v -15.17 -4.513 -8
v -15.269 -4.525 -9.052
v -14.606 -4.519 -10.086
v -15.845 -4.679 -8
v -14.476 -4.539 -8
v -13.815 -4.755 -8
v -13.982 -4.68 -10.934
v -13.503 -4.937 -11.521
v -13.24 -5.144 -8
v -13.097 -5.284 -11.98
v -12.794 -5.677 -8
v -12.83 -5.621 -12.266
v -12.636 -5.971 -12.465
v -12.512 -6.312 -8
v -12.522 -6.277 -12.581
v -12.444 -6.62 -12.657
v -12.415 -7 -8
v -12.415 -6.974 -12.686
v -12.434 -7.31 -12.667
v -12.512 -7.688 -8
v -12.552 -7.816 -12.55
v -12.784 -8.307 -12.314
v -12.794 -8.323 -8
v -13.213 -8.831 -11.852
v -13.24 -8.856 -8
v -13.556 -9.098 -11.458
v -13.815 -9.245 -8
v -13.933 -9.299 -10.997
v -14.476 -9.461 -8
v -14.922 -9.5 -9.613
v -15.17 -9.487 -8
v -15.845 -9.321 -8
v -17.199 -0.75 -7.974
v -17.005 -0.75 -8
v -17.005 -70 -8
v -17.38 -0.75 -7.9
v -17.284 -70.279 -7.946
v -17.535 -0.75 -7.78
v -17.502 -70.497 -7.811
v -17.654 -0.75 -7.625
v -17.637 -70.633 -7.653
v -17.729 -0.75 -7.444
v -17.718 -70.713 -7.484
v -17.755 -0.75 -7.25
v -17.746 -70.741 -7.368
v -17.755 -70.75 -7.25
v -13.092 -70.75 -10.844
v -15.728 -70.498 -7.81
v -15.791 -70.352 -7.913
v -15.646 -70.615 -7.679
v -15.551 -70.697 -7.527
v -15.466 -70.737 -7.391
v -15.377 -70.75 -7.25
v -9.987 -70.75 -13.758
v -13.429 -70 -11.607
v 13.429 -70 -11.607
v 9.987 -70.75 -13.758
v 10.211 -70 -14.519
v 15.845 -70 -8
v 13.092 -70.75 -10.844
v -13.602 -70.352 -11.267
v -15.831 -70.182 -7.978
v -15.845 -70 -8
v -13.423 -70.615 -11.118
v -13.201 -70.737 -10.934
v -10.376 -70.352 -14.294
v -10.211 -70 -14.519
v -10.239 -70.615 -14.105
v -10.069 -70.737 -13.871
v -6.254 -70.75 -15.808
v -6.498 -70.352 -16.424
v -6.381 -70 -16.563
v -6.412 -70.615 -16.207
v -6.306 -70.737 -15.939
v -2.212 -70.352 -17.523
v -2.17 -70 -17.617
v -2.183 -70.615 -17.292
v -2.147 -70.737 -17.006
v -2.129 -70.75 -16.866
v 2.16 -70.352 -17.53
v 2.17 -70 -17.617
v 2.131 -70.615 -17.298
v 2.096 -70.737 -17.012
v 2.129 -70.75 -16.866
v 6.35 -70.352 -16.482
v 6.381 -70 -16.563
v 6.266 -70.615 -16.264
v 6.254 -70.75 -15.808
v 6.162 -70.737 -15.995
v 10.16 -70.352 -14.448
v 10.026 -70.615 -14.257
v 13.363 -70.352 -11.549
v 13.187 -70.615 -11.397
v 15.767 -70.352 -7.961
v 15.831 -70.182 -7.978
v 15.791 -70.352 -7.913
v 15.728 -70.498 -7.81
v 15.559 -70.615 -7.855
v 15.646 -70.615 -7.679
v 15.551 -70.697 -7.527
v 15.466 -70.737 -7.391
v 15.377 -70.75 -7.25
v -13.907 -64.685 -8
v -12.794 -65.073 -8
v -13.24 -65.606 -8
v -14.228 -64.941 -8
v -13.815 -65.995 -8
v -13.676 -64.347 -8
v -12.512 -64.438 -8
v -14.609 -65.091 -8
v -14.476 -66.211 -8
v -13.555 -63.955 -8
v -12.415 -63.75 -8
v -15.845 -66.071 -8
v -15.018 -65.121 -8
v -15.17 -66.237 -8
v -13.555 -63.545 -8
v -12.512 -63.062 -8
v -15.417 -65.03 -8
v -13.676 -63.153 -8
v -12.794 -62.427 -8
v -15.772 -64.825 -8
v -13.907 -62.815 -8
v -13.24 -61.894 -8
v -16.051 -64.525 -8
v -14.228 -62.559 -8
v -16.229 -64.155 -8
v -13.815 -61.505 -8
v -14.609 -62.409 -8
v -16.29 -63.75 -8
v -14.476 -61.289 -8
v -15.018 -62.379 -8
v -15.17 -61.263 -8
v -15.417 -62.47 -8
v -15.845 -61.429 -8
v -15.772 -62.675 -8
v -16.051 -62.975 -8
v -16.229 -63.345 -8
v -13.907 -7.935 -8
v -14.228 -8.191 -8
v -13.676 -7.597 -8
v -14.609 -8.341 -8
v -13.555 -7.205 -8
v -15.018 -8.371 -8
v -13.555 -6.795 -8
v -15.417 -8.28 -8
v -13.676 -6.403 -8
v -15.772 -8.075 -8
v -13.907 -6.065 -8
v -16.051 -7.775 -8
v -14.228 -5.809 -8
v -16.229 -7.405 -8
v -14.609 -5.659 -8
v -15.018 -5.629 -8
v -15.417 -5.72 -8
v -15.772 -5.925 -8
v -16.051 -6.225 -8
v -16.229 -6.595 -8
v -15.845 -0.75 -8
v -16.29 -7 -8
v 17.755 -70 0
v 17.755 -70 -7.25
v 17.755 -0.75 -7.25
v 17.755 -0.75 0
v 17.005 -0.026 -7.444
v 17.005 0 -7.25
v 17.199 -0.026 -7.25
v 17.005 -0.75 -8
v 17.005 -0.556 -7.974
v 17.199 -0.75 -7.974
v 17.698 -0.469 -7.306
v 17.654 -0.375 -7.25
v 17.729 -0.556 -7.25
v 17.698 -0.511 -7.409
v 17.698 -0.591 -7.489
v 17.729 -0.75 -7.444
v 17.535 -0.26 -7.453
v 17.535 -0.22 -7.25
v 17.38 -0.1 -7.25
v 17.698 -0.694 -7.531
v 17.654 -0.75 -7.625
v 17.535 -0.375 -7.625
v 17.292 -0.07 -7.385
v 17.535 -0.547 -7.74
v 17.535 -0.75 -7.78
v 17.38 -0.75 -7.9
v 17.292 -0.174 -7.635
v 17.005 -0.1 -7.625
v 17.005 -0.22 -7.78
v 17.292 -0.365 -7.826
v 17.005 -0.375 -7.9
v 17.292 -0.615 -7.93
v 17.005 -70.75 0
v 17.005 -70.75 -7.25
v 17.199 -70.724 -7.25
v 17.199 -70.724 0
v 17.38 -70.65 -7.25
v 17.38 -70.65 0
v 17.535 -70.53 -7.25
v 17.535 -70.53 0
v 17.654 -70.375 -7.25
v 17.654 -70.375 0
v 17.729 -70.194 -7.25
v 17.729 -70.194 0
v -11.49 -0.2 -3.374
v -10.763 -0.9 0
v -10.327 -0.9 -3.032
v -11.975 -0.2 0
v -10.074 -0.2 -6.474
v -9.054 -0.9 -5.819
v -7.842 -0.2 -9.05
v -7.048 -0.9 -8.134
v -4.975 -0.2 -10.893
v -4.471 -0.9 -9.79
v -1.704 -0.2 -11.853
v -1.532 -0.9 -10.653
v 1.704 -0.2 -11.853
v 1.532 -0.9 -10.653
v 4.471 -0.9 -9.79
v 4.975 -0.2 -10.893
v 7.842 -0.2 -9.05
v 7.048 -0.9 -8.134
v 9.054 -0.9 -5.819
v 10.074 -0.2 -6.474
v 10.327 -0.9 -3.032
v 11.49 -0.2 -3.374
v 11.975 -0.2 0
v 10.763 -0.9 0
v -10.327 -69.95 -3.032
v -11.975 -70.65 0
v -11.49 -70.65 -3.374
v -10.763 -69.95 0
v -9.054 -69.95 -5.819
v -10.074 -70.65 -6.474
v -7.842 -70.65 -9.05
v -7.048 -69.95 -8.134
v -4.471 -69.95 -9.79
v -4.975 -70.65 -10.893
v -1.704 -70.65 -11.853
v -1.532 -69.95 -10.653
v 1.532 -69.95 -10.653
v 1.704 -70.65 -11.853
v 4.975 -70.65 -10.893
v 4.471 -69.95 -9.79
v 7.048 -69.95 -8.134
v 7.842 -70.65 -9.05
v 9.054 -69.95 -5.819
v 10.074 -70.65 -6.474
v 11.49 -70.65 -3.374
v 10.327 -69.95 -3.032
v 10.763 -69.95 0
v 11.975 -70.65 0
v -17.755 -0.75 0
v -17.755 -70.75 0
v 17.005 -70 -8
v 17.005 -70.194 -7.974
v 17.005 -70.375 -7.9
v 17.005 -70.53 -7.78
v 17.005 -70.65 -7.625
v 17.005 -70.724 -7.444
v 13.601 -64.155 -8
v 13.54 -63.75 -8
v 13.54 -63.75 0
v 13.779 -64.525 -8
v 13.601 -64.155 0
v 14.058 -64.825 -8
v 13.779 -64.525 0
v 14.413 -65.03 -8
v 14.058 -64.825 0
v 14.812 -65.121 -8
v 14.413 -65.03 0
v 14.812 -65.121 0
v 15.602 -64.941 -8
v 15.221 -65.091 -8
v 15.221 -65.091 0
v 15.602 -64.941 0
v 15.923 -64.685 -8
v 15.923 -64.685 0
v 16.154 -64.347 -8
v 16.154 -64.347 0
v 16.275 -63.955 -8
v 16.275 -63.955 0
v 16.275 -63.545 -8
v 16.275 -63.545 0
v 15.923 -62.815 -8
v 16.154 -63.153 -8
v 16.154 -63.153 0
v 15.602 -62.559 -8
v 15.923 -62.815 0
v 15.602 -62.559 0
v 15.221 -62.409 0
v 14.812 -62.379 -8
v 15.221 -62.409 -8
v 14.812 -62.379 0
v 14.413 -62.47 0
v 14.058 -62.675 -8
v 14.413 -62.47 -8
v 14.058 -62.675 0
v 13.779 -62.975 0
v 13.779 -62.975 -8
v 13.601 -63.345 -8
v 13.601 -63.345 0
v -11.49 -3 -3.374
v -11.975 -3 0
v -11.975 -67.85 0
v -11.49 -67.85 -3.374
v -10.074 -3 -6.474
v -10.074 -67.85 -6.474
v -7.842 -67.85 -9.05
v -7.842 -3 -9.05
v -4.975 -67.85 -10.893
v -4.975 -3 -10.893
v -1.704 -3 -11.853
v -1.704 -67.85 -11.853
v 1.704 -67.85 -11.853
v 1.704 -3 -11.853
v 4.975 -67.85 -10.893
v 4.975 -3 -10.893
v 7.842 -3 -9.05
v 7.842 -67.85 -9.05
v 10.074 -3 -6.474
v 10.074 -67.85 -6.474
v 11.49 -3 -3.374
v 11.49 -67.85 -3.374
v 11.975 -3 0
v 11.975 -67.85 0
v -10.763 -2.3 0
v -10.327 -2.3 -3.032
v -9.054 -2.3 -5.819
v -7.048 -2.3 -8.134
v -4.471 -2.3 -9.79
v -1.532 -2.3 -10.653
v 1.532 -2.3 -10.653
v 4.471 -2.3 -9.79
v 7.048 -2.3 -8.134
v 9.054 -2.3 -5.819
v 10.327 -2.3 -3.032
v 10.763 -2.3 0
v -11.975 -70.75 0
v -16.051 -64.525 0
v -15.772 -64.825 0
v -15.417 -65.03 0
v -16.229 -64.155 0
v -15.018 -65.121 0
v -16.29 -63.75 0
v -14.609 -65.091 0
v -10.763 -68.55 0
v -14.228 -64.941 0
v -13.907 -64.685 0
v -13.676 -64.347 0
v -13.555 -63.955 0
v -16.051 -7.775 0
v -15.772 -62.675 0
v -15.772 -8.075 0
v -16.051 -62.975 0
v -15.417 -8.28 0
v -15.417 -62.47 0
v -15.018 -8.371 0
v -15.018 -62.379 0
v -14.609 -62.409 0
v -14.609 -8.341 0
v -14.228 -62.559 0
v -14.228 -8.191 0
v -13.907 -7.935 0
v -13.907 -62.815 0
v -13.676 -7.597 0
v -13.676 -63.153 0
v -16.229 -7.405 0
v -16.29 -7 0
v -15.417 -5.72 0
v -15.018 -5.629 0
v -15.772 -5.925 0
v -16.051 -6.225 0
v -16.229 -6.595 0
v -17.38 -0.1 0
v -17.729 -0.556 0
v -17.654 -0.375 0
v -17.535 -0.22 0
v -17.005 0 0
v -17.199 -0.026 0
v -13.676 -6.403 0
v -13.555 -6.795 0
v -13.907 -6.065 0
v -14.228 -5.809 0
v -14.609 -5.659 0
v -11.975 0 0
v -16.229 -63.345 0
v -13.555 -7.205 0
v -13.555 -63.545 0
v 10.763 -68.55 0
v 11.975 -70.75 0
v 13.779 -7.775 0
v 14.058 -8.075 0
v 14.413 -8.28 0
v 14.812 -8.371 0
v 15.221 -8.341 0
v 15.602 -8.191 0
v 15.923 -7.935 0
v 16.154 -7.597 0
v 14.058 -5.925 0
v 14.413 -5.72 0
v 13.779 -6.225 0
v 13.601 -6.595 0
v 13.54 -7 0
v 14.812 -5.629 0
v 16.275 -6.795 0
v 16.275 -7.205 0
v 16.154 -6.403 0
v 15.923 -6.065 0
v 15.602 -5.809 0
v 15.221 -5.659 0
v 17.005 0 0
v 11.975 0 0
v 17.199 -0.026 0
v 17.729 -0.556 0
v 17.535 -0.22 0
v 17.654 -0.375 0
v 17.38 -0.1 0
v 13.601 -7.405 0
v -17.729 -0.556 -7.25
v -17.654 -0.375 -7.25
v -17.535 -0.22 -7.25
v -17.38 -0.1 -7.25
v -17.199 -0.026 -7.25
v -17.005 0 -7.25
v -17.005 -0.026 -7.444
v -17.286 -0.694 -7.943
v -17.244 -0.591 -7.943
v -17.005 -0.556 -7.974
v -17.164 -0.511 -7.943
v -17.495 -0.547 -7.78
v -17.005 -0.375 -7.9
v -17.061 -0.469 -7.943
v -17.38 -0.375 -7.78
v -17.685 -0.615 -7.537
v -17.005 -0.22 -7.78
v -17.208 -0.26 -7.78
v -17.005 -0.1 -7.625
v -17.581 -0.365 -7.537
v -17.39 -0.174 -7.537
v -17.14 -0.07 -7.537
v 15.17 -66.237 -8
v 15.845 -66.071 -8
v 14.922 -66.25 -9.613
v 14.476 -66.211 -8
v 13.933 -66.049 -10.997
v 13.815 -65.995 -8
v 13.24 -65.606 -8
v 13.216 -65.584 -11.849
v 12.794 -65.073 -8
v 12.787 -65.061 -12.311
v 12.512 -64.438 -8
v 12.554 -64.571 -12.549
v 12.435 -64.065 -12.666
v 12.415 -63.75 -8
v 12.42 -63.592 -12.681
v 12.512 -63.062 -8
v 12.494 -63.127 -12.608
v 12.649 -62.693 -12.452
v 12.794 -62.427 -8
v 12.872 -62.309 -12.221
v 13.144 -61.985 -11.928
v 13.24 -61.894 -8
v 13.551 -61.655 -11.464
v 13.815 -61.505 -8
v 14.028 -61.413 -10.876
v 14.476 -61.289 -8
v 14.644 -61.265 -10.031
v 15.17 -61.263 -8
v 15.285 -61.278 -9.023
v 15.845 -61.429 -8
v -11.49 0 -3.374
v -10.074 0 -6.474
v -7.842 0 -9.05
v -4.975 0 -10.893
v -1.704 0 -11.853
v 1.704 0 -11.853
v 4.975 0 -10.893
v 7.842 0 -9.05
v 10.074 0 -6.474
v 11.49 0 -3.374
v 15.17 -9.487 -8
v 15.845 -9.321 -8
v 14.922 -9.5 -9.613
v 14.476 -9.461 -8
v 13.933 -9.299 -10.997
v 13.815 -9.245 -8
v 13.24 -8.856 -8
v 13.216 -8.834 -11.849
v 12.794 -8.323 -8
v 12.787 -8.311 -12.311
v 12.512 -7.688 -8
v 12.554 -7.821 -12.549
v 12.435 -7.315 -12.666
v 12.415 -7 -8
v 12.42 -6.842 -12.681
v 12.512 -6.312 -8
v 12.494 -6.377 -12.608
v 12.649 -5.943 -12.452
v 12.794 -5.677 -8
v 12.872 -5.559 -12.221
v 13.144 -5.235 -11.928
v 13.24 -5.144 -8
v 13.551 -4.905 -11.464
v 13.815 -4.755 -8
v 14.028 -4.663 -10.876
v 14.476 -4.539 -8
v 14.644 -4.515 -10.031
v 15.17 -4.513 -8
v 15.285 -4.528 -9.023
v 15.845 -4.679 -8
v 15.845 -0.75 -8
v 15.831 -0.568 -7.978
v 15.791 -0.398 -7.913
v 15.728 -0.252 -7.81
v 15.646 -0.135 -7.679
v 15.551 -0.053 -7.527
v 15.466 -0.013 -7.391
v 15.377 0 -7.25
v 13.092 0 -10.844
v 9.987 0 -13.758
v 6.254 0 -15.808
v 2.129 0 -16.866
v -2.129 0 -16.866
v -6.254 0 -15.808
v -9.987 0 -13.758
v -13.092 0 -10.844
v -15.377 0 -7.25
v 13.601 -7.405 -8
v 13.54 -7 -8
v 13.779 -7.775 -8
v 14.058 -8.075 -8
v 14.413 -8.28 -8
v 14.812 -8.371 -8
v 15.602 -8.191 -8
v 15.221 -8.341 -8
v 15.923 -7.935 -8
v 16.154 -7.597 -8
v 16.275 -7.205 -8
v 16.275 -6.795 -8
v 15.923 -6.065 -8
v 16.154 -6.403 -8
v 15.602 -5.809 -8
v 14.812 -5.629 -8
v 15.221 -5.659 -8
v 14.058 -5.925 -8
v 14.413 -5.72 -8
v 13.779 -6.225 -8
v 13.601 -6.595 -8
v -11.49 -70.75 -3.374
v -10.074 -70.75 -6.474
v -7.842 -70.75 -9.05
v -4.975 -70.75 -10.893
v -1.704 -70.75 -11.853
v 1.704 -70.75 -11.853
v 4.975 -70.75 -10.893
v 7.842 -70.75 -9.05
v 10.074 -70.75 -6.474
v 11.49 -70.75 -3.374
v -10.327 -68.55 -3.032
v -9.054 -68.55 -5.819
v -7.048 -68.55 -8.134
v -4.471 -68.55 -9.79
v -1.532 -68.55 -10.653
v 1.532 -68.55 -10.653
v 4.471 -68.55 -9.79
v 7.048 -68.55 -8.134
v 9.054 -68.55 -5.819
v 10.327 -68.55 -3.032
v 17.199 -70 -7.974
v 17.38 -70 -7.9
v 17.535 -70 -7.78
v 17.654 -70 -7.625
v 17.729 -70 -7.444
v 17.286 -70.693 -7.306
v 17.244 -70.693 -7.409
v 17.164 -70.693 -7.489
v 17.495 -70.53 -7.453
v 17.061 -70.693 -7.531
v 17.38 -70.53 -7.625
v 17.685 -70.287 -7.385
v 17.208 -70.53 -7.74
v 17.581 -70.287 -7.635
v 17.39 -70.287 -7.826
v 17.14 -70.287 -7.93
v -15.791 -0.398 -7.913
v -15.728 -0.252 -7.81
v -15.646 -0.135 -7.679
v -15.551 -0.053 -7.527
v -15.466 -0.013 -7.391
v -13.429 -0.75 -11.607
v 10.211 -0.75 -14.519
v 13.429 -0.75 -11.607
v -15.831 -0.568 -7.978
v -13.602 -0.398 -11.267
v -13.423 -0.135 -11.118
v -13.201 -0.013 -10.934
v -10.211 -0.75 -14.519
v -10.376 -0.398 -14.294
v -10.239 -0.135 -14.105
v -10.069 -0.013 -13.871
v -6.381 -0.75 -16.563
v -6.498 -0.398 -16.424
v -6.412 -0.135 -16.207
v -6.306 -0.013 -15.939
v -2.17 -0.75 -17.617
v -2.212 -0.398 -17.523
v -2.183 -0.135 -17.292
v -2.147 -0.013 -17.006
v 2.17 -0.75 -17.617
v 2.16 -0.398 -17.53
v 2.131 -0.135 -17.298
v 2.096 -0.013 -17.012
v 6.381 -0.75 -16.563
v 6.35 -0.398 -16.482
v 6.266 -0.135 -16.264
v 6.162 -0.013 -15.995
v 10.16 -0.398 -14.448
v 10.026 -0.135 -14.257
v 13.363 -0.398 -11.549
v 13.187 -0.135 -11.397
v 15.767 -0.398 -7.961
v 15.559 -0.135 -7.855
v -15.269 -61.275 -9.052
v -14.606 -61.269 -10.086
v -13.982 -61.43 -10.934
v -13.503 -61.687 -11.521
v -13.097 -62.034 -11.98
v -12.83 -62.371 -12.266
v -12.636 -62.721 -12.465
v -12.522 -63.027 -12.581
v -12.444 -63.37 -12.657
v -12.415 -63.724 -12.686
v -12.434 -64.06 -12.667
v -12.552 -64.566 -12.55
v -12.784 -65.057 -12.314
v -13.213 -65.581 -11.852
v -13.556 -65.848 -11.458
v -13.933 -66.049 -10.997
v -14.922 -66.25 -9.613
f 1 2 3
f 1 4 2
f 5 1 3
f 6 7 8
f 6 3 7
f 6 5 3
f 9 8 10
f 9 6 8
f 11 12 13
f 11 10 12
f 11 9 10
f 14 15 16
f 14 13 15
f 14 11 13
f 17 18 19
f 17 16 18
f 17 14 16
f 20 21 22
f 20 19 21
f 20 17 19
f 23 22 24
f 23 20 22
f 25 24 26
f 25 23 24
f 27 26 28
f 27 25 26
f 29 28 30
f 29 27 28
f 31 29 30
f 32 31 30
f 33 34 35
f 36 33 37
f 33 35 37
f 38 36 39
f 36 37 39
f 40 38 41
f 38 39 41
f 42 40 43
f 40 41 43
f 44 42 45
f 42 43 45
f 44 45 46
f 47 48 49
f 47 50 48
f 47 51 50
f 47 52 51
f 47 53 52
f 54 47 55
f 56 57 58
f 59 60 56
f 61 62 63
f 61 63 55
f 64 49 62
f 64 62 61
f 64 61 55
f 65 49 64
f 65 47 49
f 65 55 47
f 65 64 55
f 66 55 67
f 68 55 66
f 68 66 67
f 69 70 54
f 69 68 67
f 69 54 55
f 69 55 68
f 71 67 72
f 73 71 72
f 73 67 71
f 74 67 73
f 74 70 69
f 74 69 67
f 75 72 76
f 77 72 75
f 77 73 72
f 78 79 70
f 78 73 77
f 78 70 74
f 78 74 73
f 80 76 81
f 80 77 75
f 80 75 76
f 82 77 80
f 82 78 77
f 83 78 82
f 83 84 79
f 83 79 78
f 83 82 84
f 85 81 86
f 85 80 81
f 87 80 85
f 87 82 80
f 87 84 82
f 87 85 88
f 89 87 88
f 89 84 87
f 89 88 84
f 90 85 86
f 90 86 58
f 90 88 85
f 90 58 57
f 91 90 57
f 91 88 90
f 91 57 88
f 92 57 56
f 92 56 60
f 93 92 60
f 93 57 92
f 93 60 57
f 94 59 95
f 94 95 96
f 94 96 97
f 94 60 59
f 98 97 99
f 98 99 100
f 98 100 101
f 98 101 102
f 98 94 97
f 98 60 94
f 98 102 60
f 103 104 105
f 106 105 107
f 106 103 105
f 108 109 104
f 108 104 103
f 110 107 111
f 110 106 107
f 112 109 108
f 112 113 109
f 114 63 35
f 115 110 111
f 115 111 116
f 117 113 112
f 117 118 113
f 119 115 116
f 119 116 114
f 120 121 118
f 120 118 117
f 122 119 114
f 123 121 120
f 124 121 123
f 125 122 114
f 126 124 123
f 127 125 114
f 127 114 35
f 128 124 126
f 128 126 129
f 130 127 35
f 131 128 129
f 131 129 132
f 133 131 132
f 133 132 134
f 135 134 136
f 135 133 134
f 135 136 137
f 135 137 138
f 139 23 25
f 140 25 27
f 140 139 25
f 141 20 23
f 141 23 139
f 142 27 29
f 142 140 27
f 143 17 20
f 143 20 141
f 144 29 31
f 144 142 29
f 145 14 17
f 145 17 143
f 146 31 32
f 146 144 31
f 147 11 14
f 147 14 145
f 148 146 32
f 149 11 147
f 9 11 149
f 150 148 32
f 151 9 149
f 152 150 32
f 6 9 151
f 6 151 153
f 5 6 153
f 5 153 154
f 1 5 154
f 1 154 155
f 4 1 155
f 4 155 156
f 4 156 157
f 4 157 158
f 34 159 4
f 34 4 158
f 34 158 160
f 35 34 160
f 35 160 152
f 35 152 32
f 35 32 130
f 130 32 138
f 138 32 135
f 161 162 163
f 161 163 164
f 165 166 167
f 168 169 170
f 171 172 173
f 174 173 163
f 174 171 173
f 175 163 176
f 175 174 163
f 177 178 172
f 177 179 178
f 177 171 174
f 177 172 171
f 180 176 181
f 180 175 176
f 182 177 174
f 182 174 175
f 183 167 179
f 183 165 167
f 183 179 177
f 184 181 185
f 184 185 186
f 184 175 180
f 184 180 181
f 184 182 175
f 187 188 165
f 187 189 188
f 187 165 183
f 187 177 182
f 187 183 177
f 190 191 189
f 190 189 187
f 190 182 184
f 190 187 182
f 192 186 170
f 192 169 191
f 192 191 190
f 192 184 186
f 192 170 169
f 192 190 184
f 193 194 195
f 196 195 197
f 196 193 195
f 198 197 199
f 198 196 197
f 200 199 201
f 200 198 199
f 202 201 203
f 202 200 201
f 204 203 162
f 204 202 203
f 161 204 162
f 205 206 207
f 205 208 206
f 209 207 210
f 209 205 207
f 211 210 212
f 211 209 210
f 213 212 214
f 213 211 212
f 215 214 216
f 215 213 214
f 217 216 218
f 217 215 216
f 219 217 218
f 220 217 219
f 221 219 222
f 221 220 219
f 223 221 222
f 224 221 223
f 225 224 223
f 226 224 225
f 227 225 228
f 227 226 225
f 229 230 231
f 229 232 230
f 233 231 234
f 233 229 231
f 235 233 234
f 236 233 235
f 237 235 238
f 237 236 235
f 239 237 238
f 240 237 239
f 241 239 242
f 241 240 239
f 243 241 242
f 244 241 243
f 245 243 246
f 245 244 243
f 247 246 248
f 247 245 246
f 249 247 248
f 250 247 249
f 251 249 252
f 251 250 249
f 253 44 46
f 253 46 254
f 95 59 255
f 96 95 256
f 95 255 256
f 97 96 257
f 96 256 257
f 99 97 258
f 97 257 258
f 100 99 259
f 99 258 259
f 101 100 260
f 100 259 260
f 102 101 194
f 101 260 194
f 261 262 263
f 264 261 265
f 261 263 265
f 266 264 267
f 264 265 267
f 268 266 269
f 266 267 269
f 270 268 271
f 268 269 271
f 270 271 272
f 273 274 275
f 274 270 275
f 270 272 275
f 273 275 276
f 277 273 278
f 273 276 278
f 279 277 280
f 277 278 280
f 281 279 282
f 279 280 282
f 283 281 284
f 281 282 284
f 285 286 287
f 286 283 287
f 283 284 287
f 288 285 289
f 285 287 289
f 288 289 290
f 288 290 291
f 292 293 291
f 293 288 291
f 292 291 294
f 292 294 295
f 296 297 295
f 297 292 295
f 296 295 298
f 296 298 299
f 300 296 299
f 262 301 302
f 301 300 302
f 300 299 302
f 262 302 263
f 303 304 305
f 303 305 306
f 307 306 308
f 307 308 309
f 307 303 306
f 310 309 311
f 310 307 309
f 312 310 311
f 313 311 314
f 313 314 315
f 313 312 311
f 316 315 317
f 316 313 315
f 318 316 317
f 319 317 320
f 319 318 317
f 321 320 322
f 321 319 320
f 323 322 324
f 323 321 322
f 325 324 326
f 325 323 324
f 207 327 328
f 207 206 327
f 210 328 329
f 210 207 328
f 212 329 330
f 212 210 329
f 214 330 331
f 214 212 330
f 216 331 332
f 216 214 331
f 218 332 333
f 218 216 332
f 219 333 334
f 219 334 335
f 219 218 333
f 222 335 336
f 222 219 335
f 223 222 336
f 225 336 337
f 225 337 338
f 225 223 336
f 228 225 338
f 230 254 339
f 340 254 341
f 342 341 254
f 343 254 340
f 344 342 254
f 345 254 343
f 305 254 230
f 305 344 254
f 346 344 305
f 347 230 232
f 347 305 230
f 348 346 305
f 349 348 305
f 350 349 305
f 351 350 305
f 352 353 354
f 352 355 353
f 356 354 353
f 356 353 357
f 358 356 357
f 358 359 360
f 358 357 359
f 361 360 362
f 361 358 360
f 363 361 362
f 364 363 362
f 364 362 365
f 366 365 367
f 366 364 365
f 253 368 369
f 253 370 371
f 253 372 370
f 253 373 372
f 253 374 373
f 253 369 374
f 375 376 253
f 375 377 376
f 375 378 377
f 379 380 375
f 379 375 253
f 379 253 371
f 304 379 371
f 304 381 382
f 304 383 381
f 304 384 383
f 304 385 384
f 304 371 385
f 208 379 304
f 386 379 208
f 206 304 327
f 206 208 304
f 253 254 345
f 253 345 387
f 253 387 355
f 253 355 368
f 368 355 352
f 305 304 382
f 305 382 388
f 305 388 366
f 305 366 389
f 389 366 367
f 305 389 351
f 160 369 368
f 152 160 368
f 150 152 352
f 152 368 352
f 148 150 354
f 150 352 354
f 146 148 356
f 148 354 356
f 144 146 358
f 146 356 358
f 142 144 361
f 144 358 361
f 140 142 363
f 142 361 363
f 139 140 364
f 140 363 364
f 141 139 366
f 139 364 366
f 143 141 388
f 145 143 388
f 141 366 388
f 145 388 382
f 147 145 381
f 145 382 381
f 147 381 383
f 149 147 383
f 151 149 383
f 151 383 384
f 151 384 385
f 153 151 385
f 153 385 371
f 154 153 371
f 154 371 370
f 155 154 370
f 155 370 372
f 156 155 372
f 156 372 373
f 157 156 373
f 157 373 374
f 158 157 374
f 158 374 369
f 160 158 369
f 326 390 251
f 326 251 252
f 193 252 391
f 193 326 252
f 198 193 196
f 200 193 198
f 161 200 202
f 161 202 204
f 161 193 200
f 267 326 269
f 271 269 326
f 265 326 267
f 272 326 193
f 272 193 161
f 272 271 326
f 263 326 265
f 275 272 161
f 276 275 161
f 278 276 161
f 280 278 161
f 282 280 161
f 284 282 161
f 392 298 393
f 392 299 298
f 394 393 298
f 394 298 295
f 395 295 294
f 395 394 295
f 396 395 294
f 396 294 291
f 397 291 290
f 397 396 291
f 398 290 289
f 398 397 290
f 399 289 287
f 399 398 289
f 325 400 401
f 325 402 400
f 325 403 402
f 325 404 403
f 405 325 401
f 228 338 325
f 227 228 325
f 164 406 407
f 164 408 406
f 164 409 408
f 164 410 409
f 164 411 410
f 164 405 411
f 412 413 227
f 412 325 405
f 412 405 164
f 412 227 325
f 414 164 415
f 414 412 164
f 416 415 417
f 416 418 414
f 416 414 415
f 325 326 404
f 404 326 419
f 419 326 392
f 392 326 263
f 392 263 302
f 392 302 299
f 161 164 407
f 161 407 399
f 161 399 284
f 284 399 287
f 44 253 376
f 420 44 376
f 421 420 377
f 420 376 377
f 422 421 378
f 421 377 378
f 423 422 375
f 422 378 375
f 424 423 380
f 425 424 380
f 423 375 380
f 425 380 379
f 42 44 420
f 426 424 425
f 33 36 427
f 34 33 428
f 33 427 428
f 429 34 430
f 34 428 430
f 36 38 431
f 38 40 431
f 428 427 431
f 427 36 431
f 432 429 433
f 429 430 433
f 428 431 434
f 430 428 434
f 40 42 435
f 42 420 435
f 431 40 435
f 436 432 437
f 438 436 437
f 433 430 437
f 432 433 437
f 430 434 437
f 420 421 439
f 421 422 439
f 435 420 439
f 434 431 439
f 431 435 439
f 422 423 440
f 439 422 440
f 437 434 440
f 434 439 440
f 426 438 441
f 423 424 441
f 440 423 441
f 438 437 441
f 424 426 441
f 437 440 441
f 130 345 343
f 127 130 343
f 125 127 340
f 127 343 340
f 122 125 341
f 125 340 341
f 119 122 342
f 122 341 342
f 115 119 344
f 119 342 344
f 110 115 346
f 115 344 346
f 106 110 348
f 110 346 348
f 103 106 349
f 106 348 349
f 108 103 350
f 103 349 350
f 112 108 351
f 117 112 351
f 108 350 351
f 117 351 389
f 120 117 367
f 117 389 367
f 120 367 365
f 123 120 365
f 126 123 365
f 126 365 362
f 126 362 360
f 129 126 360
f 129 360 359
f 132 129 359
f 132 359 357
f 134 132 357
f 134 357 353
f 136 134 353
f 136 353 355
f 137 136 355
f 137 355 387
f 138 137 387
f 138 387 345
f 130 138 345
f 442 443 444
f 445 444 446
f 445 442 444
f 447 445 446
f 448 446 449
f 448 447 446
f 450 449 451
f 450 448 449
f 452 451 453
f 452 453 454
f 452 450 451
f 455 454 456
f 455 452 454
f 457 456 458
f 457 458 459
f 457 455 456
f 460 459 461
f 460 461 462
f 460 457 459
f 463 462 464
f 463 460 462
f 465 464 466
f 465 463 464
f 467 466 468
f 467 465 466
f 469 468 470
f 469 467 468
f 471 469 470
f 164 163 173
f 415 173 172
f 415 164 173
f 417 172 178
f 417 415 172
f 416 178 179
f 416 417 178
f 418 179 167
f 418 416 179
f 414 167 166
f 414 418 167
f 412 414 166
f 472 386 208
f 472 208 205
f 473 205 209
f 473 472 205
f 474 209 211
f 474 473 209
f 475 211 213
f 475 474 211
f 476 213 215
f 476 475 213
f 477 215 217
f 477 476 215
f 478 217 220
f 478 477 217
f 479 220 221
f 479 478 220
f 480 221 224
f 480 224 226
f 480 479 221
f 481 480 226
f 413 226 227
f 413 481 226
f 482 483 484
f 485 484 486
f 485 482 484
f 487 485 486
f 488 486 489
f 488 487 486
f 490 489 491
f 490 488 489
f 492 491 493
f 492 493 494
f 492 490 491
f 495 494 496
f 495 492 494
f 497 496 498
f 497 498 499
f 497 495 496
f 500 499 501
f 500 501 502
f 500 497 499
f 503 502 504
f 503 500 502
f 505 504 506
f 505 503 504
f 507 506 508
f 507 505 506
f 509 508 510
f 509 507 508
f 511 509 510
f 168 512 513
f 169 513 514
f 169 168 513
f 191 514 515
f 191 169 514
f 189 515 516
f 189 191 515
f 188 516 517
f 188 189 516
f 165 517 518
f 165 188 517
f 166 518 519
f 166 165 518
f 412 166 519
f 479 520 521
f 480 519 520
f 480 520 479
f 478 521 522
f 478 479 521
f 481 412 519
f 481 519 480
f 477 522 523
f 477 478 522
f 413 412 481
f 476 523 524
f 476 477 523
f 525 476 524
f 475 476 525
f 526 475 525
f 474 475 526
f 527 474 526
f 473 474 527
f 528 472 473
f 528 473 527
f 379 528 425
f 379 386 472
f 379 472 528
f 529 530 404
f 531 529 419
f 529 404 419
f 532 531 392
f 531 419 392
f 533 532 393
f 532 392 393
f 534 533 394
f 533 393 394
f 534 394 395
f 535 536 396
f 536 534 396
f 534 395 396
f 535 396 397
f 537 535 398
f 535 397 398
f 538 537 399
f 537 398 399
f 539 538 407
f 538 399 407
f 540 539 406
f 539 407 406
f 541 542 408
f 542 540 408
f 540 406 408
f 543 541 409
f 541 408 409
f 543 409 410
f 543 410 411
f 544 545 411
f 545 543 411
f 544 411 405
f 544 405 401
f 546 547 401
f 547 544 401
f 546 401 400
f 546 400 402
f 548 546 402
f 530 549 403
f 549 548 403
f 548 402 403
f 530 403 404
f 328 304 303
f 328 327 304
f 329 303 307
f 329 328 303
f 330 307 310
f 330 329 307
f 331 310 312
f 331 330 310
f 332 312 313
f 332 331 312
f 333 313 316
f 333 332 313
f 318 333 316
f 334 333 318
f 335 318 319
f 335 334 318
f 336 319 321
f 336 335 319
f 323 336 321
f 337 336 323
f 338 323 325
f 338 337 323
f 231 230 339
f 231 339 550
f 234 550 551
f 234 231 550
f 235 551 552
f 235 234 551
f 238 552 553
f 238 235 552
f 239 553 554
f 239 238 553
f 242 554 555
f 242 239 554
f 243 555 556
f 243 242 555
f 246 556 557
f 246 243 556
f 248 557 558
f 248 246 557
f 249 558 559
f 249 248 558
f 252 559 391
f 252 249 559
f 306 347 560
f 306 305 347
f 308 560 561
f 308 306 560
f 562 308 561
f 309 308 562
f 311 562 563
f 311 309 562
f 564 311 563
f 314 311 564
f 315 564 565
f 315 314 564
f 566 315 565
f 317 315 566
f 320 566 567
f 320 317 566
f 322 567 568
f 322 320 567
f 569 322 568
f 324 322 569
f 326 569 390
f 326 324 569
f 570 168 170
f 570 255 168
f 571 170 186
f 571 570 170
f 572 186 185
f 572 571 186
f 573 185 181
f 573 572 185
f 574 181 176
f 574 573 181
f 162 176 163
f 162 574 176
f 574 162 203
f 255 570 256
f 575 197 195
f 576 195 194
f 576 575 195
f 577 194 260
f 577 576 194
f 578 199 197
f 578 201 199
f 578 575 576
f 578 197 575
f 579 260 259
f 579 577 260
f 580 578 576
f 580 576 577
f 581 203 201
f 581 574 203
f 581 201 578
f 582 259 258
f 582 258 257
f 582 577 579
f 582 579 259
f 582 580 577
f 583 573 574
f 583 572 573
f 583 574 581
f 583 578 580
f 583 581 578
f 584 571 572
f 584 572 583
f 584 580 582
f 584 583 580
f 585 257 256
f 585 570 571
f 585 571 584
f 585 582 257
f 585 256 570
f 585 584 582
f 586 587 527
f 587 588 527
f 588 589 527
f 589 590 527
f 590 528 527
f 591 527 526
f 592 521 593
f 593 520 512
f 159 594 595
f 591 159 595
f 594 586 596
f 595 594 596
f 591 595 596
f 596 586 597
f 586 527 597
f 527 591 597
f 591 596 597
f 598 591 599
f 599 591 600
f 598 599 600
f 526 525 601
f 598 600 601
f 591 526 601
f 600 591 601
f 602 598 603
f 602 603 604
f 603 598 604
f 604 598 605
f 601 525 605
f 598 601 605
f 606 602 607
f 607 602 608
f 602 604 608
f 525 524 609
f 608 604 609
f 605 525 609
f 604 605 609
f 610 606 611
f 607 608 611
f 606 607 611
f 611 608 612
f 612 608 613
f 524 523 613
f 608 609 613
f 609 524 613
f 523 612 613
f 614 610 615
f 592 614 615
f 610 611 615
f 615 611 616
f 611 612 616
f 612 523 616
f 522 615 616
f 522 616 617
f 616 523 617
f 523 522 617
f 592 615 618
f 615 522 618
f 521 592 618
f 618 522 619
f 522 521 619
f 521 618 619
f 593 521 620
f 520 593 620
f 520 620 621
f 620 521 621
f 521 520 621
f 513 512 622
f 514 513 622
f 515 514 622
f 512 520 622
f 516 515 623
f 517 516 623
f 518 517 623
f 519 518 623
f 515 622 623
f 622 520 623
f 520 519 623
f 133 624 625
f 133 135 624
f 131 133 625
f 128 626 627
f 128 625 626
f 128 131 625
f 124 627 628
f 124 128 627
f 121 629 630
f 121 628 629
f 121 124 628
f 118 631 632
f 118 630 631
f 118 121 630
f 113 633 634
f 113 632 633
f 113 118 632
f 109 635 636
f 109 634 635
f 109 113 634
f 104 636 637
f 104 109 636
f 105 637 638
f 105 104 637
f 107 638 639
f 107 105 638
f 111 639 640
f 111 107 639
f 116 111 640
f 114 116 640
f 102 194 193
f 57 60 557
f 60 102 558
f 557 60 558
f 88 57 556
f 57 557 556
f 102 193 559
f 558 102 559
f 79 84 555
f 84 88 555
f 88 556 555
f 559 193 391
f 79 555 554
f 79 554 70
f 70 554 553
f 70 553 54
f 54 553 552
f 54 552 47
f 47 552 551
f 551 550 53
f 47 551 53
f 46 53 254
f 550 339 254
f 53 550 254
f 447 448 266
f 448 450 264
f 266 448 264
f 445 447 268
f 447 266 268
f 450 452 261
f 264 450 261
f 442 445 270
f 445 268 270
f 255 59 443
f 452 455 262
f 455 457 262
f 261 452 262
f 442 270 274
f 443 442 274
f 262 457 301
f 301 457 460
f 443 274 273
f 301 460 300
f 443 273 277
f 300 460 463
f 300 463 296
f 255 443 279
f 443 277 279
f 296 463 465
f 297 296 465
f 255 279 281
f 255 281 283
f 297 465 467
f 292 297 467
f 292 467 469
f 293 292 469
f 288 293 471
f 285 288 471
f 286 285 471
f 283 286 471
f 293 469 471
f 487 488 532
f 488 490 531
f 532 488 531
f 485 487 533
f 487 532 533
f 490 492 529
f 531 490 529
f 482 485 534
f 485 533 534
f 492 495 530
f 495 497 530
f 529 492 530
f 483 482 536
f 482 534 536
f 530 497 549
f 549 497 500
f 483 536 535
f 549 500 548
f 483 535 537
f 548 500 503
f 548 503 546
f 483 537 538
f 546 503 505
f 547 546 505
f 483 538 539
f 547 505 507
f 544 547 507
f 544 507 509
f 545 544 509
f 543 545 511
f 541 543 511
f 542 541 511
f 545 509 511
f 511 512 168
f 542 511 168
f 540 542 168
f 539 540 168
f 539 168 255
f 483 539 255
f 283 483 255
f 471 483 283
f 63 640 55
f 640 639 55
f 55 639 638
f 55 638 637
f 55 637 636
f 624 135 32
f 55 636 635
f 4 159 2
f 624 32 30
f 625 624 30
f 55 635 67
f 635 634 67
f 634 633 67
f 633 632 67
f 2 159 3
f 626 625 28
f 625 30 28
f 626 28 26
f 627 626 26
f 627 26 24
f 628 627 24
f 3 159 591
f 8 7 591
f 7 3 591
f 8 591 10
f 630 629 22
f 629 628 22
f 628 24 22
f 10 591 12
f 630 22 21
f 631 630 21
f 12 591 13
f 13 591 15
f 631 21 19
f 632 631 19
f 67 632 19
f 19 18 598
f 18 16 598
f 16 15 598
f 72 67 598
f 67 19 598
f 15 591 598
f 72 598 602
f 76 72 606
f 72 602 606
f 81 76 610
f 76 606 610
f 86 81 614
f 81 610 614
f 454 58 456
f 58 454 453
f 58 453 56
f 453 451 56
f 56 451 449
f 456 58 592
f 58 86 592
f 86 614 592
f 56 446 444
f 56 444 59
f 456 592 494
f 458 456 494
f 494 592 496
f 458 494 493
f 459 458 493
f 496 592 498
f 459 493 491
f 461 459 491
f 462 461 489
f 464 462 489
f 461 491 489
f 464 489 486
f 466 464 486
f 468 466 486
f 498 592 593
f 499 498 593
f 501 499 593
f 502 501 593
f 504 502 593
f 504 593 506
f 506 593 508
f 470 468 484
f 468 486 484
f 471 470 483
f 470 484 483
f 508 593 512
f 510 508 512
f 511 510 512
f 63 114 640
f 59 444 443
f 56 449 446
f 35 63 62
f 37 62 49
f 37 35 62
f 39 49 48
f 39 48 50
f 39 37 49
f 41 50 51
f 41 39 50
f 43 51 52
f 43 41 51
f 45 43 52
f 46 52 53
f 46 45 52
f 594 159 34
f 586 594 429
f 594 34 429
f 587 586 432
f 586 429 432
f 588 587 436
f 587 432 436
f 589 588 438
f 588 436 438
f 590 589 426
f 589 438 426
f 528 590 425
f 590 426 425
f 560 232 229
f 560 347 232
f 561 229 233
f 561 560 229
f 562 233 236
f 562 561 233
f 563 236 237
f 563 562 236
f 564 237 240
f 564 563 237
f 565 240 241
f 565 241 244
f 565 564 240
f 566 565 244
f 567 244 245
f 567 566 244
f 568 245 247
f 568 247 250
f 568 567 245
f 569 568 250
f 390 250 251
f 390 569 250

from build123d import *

# Parameters (mm, degrees)
PAD015_DEPTH        = 70.75
REVOLUTION002_ANGLE = 180
SKETCH027_R         = 1.375
POCKET008_DEPTH     = 17.751
SKETCH028_R         = 2.5
POCKET009_DEPTH     = 9.751
FILLET001_R         = 0.75


with BuildPart() as part:
    # Sketch025 → Pad015 (new body)
    with BuildSketch(Plane.XZ):
        with BuildLine():
            ThreePointArc((-11.975, 0), (0, -11.975), (11.975, 0))
            Line((11.975, 0), (17.754952, 0))
            Line((17.754952, -8), (17.754952, 0))
            Line((15.844952, -8), (17.754952, -8))
            ThreePointArc((-15.844952, -8), (0, -17.75), (15.844952, -8))
            Line((-15.844952, -8), (-17.754952, -8))
            Line((-17.754952, -8), (-17.754952, 0))
            Line((-17.754952, 0), (-11.975, 0))
        make_face()
    extrude(amount=PAD015_DEPTH)

    # Sketch026 (on Face3 of Pad015) → Revolution002 (revolve)
    with BuildSketch(Plane(origin=(0, 0, 0), x_dir=(-1, 0, 0), z_dir=(0, 0, 1))):
        Polygon((13.187436, 69.95), (11.975, 70.65), (10.762564, 69.95), (10.762564, 68.55), (11.975, 67.85), (13.187436, 68.55), align=None)
        Polygon((13.187436, 2.3), (11.975, 3), (10.762564, 2.3), (10.762564, 0.9), (11.975, 0.2), (13.187436, 0.9), align=None)
    revolve(axis=Axis((0, 0, 0), (0, -1, 0)), revolution_arc=REVOLUTION002_ANGLE)

    # Sketch027 (on Face18 of Revolution002) → Pocket008 (cut, through all)
    with BuildSketch(Plane(origin=(0, 0, 0), x_dir=(-1, 0, 0), z_dir=(0, 0, 1))):
        with Locations((-14.915, 63.75)):
            Circle(SKETCH027_R)
        with Locations((14.915, 63.75)):
            Circle(SKETCH027_R)
        with Locations((14.915, 7)):
            Circle(SKETCH027_R)
        with Locations((-14.915, 7)):
            Circle(SKETCH027_R)
    extrude(amount=-POCKET008_DEPTH, mode=Mode.SUBTRACT)

    # Sketch028 (on Face20 of Pocket008) → Pocket009 (cut, through all)
    with BuildSketch(Plane(origin=(0, 0, -8), x_dir=(1, 0, 0), z_dir=(0, 0, -1))):
        with Locations((-14.915, 63.75)):
            Circle(SKETCH028_R)
        with Locations((14.915, 63.75)):
            Circle(SKETCH028_R)
        with Locations((14.915, 7)):
            Circle(SKETCH028_R)
        with Locations((-14.915, 7)):
            Circle(SKETCH028_R)
    extrude(amount=POCKET009_DEPTH, mode=Mode.SUBTRACT)

    # Fillet001
    fillet001_edges = [part.edges().sort_by_distance(p)[0] for p in [
        (-17.754952, 0, -4),
        (-17.754952, -35.375, -8),
        (-16.799952, 0, -8),
        (0, 0, -17.75),
        (16.799952, 0, -8),
        (17.754952, 0, -4),
        (17.754952, -35.375, -8),
        (17.754952, -70.75, -4),
        (16.799952, -70.75, -8),
        (0, -70.75, -17.75),
        (-16.799952, -70.75, -8),
    ]]
    fillet(fillet001_edges, radius=FILLET001_R)


solid = part.part
